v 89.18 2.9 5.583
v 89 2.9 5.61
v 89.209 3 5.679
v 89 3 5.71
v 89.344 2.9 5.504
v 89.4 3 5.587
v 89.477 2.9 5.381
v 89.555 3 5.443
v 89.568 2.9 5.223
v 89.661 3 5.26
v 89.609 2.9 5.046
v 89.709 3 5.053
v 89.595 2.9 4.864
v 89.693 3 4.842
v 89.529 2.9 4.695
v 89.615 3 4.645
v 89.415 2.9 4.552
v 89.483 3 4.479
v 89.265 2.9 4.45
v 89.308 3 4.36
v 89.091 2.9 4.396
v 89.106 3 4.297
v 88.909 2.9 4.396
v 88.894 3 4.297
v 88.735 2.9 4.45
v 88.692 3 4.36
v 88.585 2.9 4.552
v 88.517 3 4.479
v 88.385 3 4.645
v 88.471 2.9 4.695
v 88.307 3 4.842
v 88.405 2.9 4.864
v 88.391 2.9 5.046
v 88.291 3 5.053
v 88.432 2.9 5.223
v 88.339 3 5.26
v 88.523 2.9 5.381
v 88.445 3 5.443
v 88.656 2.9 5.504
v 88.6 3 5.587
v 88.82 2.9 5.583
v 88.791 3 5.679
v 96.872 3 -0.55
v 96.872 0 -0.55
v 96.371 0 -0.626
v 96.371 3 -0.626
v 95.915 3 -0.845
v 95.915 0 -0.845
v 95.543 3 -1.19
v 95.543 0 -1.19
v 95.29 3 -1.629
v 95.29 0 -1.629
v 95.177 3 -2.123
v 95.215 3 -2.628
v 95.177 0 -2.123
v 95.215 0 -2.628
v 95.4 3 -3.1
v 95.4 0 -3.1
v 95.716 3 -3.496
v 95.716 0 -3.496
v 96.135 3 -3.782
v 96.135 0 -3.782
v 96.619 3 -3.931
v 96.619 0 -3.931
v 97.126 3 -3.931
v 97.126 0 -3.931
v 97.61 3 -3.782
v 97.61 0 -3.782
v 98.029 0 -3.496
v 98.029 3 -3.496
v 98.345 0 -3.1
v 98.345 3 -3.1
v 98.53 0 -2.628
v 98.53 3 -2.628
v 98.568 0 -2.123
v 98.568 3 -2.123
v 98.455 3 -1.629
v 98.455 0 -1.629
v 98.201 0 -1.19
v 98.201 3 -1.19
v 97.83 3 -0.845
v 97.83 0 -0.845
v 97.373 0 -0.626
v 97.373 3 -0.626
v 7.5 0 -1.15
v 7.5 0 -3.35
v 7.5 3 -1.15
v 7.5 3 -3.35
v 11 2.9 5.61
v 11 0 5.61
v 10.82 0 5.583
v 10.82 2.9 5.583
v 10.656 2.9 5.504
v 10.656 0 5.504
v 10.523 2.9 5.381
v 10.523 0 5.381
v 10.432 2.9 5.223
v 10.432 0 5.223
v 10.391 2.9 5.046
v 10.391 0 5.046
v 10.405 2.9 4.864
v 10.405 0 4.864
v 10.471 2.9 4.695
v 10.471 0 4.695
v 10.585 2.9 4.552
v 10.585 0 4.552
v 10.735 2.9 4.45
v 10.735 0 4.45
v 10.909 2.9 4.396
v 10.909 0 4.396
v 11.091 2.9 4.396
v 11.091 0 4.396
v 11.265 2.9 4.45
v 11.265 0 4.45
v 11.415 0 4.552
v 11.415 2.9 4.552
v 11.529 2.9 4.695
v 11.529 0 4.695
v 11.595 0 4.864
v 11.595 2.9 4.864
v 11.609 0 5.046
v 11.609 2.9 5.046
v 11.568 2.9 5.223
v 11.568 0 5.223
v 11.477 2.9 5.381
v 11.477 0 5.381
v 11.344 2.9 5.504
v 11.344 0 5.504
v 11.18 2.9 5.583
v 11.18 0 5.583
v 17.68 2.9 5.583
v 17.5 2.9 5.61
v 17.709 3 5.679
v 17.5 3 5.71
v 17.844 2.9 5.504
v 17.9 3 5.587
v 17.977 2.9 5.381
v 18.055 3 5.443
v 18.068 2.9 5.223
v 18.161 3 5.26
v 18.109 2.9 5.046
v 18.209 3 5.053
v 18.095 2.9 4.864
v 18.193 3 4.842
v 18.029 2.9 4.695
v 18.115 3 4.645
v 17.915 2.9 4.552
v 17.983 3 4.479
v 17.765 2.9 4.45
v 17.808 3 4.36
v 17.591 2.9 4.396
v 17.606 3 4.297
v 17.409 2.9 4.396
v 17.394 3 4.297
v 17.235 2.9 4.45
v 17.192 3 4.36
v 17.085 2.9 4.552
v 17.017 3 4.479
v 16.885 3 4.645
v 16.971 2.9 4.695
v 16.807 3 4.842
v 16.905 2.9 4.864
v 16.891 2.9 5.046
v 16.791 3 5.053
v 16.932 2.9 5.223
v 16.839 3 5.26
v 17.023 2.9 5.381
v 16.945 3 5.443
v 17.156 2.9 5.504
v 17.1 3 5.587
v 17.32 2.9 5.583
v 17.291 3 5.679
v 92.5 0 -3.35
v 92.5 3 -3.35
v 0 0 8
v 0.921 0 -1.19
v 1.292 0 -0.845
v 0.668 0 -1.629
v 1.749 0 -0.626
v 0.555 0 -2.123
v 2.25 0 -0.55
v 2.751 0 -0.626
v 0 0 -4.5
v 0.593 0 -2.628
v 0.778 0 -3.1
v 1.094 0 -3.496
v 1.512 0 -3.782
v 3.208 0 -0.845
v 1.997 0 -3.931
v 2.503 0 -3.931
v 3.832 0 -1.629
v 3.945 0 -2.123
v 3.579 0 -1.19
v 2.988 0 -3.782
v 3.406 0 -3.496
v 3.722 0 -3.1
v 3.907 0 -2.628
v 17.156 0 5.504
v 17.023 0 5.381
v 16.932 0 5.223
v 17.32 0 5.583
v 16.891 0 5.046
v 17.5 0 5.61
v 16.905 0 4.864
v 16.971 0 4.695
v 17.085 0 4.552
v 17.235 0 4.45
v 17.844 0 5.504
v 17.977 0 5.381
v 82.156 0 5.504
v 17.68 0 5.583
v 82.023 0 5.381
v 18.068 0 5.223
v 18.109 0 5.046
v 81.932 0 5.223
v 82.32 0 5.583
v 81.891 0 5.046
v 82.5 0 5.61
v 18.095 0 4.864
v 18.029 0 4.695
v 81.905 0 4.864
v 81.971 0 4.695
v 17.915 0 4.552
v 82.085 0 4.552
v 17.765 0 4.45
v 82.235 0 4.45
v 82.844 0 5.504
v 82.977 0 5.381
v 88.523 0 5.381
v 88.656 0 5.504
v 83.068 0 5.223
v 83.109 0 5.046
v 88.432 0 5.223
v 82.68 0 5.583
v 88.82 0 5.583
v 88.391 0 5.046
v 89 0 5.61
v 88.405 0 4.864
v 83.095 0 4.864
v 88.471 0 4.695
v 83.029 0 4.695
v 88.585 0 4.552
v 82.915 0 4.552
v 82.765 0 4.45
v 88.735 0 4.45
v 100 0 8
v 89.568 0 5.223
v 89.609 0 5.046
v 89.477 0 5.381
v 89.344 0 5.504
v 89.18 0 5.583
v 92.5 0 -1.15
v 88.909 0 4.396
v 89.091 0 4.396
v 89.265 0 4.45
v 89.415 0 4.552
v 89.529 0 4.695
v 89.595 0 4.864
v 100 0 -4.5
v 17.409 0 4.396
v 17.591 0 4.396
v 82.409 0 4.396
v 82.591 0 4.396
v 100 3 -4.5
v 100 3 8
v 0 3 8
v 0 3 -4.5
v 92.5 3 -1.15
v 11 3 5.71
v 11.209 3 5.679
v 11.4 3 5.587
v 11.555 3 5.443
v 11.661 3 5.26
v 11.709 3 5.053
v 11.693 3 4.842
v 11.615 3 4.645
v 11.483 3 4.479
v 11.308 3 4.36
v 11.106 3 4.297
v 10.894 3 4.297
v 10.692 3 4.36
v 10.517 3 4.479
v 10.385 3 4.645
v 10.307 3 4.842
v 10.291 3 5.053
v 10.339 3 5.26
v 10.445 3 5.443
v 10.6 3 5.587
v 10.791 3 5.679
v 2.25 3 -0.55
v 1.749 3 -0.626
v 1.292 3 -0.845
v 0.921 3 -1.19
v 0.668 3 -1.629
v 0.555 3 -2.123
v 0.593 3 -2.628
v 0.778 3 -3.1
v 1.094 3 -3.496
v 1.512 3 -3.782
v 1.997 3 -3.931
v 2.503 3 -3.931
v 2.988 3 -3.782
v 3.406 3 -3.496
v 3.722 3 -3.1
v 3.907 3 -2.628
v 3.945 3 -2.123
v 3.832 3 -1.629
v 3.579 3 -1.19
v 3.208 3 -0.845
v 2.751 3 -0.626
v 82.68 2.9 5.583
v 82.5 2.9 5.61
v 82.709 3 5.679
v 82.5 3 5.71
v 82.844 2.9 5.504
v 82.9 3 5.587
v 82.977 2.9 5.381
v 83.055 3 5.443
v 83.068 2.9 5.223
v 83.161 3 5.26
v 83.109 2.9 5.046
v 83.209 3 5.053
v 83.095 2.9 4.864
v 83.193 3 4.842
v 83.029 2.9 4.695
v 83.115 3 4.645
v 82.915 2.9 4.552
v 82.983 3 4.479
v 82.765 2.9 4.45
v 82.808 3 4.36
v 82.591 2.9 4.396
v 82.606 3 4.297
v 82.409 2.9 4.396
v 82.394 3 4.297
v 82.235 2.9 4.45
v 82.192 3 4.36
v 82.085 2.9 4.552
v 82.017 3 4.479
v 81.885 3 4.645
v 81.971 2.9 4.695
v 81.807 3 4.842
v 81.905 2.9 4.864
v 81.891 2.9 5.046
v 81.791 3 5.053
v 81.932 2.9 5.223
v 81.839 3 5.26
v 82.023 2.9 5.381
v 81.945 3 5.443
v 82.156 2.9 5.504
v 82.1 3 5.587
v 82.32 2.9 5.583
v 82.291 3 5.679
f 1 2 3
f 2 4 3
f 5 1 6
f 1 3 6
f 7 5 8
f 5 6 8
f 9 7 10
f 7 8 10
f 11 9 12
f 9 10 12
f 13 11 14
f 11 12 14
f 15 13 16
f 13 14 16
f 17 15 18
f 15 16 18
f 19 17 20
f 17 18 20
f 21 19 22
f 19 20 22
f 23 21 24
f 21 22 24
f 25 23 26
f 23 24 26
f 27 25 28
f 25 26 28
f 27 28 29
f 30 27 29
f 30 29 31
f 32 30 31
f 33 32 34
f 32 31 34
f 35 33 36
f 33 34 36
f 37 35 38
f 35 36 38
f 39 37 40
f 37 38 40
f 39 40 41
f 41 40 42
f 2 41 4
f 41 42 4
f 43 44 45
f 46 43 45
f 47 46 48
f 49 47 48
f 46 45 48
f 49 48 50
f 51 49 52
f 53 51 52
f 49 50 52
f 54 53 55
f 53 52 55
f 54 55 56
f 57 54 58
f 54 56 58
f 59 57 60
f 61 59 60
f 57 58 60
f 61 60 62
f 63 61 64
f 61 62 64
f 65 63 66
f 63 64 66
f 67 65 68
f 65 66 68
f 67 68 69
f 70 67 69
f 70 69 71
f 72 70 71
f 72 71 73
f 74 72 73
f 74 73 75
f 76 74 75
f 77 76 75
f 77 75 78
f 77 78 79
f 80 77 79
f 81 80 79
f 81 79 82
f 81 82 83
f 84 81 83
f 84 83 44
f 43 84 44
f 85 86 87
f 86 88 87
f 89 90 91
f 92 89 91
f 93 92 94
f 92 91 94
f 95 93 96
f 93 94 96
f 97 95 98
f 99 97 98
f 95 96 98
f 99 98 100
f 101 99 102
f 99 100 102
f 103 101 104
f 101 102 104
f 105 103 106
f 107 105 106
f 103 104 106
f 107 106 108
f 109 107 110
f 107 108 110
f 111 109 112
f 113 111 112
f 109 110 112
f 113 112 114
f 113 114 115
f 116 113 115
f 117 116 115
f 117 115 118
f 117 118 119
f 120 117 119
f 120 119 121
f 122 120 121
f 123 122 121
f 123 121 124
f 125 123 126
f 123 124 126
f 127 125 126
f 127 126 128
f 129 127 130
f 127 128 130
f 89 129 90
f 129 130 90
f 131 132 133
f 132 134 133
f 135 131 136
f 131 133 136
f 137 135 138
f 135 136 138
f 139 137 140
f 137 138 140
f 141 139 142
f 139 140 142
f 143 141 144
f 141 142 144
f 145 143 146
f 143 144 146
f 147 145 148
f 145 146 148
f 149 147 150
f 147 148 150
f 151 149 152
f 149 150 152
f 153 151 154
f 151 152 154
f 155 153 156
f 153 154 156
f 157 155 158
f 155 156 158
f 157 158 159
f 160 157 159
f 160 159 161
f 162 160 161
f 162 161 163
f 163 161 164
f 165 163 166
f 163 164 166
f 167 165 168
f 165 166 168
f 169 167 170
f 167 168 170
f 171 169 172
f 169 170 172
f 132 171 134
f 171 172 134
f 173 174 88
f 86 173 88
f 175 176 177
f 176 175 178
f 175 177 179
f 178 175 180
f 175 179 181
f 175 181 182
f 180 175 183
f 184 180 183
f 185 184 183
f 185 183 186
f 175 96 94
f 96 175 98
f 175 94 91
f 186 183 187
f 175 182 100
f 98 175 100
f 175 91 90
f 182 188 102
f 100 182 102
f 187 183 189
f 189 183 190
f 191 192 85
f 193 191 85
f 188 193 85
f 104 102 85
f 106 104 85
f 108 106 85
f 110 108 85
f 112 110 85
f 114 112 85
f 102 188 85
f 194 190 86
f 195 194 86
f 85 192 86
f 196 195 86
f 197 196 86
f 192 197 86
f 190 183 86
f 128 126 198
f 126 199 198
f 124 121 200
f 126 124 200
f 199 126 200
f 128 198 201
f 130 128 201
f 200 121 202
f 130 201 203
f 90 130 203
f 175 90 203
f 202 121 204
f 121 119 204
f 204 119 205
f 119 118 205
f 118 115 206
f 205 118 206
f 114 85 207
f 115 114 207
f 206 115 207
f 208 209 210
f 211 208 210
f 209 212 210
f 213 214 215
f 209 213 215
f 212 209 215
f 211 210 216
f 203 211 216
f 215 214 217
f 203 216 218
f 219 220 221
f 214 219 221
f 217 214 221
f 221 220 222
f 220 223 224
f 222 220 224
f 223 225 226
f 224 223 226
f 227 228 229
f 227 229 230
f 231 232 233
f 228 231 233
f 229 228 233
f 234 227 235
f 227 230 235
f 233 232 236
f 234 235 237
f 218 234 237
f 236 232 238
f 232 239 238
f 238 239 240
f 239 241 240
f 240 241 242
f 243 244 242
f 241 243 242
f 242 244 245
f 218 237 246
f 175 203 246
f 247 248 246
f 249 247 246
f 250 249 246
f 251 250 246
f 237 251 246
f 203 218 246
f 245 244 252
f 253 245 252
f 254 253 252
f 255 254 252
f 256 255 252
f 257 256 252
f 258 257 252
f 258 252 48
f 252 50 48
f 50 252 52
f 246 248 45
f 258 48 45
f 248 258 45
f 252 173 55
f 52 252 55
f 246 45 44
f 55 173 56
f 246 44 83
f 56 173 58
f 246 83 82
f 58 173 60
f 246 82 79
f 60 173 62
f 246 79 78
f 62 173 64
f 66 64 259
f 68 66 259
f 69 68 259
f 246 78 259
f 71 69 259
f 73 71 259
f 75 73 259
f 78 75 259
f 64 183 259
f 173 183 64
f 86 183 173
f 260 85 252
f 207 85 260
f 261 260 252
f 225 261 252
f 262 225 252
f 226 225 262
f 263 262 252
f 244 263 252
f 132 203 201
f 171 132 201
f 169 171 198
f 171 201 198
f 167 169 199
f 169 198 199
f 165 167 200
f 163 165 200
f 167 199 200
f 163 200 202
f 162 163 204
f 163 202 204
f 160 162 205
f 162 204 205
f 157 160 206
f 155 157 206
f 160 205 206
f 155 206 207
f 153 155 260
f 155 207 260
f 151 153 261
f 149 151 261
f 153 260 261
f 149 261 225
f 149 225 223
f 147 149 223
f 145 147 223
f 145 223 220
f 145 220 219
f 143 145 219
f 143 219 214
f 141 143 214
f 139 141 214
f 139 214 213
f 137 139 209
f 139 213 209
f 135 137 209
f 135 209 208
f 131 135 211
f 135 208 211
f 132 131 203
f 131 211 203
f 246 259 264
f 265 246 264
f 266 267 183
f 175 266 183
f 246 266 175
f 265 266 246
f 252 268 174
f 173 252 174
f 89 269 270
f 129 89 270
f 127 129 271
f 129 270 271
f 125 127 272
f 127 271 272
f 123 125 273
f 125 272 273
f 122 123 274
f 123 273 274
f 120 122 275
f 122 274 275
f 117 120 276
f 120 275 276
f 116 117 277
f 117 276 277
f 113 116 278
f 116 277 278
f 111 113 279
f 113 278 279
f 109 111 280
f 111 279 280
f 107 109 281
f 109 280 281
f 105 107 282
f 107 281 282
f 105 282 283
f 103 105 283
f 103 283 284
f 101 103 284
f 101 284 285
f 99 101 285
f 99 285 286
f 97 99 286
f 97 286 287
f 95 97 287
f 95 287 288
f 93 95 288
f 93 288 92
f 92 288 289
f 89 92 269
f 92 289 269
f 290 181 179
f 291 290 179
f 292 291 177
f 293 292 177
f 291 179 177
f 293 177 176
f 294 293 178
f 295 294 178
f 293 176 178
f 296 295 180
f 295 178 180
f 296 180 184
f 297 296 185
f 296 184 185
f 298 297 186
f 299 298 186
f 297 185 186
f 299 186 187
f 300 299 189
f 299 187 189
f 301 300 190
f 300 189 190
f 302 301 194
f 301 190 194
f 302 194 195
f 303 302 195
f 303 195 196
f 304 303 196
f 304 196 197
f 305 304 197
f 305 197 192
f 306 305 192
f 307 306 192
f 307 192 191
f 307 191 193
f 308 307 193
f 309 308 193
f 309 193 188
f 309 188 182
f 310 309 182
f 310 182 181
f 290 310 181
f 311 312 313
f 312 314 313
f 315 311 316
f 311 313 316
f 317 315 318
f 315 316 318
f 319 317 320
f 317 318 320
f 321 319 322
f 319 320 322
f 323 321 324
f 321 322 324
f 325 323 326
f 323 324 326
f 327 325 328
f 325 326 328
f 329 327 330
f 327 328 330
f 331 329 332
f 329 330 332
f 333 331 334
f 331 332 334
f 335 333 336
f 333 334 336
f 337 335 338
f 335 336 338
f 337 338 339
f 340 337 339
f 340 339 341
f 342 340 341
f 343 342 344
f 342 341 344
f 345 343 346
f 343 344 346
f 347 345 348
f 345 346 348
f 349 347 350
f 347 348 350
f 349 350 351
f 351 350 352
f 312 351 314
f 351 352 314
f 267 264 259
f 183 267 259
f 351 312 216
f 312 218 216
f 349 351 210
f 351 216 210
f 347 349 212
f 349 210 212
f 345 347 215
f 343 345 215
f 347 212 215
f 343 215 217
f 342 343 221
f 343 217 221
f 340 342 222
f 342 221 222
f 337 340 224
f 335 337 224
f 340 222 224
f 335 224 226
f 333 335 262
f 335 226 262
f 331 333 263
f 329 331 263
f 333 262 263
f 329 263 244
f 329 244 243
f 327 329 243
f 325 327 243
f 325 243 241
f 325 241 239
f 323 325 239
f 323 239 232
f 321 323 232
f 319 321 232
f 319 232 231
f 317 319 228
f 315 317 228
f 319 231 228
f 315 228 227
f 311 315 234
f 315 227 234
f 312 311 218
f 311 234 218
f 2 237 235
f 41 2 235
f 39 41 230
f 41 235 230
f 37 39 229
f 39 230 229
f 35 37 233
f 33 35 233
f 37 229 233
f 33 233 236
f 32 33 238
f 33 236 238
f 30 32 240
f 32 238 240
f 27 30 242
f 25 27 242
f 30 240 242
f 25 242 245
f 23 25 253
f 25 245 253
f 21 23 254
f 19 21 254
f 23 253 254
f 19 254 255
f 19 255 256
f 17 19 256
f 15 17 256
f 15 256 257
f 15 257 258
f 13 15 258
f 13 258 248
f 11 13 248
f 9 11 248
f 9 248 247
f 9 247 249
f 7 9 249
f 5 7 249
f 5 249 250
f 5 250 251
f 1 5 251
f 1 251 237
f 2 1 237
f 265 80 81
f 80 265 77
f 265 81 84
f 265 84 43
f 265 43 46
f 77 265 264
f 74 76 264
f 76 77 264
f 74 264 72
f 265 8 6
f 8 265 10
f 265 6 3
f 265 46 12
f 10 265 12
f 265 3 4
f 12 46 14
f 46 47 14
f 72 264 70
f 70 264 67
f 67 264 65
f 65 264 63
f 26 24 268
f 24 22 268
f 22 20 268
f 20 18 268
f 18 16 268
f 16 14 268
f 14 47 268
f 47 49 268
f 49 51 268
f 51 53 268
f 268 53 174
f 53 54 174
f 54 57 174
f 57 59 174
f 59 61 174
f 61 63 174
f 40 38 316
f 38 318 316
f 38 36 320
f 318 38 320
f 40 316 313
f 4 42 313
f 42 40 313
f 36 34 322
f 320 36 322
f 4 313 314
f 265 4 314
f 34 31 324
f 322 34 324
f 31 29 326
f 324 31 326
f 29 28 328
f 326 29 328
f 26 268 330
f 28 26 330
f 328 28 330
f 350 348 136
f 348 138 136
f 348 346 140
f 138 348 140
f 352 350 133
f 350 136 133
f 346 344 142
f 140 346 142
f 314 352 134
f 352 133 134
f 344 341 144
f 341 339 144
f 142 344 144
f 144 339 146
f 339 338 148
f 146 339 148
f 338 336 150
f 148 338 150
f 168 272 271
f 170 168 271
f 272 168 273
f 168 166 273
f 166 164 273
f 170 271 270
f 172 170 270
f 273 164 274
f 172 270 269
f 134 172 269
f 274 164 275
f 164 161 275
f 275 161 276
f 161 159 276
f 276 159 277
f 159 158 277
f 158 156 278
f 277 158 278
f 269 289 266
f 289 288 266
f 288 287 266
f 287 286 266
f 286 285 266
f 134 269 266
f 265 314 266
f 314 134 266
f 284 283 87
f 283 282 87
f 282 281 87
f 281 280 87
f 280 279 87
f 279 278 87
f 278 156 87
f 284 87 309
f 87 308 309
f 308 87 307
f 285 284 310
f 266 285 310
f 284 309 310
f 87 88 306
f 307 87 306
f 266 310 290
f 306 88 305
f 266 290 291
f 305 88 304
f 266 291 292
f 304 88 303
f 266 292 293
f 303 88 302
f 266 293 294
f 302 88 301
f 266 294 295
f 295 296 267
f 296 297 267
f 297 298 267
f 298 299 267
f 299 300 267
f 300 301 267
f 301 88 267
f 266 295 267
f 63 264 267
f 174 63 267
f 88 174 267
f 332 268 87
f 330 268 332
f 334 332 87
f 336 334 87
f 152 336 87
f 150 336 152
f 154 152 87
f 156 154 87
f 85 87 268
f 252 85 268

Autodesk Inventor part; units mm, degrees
ref_plane "YZ Plane" through (0, 0, 0) normal (1, 0, 0) x (0, 1, 0)
ref_plane "XZ Plane" through (0, 0, 0) normal (0, 1, 0) x (-1, 0, 0)
ref_plane "XY Plane" through (0, 0, 0) normal (0, 0, 1) x (1, 0, 0)
sketch "Sketch4" plane through (0, 0, 0) normal (1, 0, 0) x (0, 1, 0)
  line L0 (0, 0) -> (3, 0)
  line L1 (3, 0) -> (3, -4.5)
  line L2 (3, -4.5) -> (0, -4.5)
  line L3 (0, -4.5) -> (0, 0)
  dimension "d21" = 3
  dimension "d22" = 4.5
extrude "Extrusion2" add sketch "Sketch4" along normal blind 100
sketch "Sketch5" plane through (0, 3, 0) normal (0, 1, 0) x (1, 0, 0)
  circle A0 centre (2.25, 2.25) radius 1.5
  circle A1 centre (96.8723, 2.25) radius 1.5
  line L0 (0, 4.5) -> (0, 0) construction
  line L1 (0, 0) -> (100, 0) construction
  dimension "d25" = 3
  dimension "d26" = 3
  dimension "d27" = 2.25
  dimension "d28" = 2.25
  dimension "d29" = 4.5
hole "Hole2" at (2.25, 3, -2.25) at (96.8723, 3, -2.25) direction (0, -1, 0) diameter 3.4 depth 8.8 tip angle 118 clearance for "Socket Head Cap Screw ISO 4762" size "M3" standard "ISO"
sketch "Sketch6" plane through (0, 3, 0) normal (0, 1, 0) x (1, 0, 0)
  line L0 (7.5, 1.15) -> (92.5, 1.15)
  line L1 (92.5, 1.15) -> (92.5, 3.35)
  line L2 (92.5, 3.35) -> (7.5, 3.35)
  line L3 (7.5, 3.35) -> (7.5, 1.15)
  line L4 (0, 4.5) -> (100, 4.5) projected
  line L5 (0, 0) -> (100, 0) projected
  line L6 (0, 4.5) -> (0, 0) projected
  dimension "d37" = 85
  dimension "d38" = 2.2
  dimension "d39" = 4.5
  dimension "d40" = 1.15
  dimension "d41" = 7.5
extrude "Extrusion3" cut sketch "Sketch6" against normal blind 100
sketch "Sketch7" plane through (0, 0, 0) normal (0, 0, 1) x (1, 0, 0)
  line L0 (0, 0) -> (100, 0)
  line L1 (100, 0) -> (100, 3)
  line L2 (100, 3) -> (0, 3)
  line L3 (0, 3) -> (0, 0)
extrude "Extrusion4" add sketch "Sketch7" along normal blind 8
sketch "Sketch8" plane through (0, 3, -4.5) normal (0, 1, 0) x (1, 0, 0)
  line L0 (11, -9.5) -> (89, -9.5) construction
  line L1 (0, 0) -> (0, -12.5) projected
  line L2 (-1, -16) -> (89, -16) construction
  line L3 (-1, -17) -> (89, -17) construction
  line L4 (89, -15) -> (-1, -15) construction
  arc A0 (-1, -15) -> (-1, -17) centre (-1, -16) ccw construction
  arc A1 (89, -17) -> (89, -15) centre (89, -16) ccw construction
  circle A2 centre (11, -9.5) radius 1
  circle A3 centre (89, -9.5) radius 1
  circle A4 centre (82.5, -9.5) radius 1
  circle A5 centre (17.5, -9.5) radius 1
  point P0 (0, -4.5)
  point P1 (50, -9.5)
  point P2 (44, -16)
  dimension "d47" = 78
  dimension "d48" = 50
  dimension "d49" = 2
  dimension "d50" = 90
  dimension "d51" = 6.5
  dimension "d54" = 9.5
  dimension "d55" = 2
  dimension "d56" = 2
  dimension "d57" = 2
  dimension "d58" = 2
  dimension "d59" = 6.5
  dimension "d60" = 6.5
sketch "Sketch9" plane through (0, 0, -4.5) normal (0, -1, 0) x (1, 0, 0)
  point P0 (0, 4.5)
sketch "Sketch10" plane through (0, 0, -4.5) normal (0, -1, 0) x (1, 0, 0)
  point P0 (0, 4.5)
hole "Hole3" at (11, 3, 5) at (17.5, 3, 5) at (82.5, 3, 5) at (89, 3, 5) direction (0, -1, 0) diameter 1.221 depth 5.3 tip angle 118 thread size "M1.6x0.35" class "6H" standard "ISO Metric profile"
chamfer "Chamfer1" distance 0.1 angle 45 4 edges at (11, 3, 4.3895) (17.5, 3, 4.3895) (82.5, 3, 4.3895) (89, 3, 4.3895)
equation "\"d27\" = d28"
equation "\"d28\" = 0.5 * d29"
properties part number "szyna"
